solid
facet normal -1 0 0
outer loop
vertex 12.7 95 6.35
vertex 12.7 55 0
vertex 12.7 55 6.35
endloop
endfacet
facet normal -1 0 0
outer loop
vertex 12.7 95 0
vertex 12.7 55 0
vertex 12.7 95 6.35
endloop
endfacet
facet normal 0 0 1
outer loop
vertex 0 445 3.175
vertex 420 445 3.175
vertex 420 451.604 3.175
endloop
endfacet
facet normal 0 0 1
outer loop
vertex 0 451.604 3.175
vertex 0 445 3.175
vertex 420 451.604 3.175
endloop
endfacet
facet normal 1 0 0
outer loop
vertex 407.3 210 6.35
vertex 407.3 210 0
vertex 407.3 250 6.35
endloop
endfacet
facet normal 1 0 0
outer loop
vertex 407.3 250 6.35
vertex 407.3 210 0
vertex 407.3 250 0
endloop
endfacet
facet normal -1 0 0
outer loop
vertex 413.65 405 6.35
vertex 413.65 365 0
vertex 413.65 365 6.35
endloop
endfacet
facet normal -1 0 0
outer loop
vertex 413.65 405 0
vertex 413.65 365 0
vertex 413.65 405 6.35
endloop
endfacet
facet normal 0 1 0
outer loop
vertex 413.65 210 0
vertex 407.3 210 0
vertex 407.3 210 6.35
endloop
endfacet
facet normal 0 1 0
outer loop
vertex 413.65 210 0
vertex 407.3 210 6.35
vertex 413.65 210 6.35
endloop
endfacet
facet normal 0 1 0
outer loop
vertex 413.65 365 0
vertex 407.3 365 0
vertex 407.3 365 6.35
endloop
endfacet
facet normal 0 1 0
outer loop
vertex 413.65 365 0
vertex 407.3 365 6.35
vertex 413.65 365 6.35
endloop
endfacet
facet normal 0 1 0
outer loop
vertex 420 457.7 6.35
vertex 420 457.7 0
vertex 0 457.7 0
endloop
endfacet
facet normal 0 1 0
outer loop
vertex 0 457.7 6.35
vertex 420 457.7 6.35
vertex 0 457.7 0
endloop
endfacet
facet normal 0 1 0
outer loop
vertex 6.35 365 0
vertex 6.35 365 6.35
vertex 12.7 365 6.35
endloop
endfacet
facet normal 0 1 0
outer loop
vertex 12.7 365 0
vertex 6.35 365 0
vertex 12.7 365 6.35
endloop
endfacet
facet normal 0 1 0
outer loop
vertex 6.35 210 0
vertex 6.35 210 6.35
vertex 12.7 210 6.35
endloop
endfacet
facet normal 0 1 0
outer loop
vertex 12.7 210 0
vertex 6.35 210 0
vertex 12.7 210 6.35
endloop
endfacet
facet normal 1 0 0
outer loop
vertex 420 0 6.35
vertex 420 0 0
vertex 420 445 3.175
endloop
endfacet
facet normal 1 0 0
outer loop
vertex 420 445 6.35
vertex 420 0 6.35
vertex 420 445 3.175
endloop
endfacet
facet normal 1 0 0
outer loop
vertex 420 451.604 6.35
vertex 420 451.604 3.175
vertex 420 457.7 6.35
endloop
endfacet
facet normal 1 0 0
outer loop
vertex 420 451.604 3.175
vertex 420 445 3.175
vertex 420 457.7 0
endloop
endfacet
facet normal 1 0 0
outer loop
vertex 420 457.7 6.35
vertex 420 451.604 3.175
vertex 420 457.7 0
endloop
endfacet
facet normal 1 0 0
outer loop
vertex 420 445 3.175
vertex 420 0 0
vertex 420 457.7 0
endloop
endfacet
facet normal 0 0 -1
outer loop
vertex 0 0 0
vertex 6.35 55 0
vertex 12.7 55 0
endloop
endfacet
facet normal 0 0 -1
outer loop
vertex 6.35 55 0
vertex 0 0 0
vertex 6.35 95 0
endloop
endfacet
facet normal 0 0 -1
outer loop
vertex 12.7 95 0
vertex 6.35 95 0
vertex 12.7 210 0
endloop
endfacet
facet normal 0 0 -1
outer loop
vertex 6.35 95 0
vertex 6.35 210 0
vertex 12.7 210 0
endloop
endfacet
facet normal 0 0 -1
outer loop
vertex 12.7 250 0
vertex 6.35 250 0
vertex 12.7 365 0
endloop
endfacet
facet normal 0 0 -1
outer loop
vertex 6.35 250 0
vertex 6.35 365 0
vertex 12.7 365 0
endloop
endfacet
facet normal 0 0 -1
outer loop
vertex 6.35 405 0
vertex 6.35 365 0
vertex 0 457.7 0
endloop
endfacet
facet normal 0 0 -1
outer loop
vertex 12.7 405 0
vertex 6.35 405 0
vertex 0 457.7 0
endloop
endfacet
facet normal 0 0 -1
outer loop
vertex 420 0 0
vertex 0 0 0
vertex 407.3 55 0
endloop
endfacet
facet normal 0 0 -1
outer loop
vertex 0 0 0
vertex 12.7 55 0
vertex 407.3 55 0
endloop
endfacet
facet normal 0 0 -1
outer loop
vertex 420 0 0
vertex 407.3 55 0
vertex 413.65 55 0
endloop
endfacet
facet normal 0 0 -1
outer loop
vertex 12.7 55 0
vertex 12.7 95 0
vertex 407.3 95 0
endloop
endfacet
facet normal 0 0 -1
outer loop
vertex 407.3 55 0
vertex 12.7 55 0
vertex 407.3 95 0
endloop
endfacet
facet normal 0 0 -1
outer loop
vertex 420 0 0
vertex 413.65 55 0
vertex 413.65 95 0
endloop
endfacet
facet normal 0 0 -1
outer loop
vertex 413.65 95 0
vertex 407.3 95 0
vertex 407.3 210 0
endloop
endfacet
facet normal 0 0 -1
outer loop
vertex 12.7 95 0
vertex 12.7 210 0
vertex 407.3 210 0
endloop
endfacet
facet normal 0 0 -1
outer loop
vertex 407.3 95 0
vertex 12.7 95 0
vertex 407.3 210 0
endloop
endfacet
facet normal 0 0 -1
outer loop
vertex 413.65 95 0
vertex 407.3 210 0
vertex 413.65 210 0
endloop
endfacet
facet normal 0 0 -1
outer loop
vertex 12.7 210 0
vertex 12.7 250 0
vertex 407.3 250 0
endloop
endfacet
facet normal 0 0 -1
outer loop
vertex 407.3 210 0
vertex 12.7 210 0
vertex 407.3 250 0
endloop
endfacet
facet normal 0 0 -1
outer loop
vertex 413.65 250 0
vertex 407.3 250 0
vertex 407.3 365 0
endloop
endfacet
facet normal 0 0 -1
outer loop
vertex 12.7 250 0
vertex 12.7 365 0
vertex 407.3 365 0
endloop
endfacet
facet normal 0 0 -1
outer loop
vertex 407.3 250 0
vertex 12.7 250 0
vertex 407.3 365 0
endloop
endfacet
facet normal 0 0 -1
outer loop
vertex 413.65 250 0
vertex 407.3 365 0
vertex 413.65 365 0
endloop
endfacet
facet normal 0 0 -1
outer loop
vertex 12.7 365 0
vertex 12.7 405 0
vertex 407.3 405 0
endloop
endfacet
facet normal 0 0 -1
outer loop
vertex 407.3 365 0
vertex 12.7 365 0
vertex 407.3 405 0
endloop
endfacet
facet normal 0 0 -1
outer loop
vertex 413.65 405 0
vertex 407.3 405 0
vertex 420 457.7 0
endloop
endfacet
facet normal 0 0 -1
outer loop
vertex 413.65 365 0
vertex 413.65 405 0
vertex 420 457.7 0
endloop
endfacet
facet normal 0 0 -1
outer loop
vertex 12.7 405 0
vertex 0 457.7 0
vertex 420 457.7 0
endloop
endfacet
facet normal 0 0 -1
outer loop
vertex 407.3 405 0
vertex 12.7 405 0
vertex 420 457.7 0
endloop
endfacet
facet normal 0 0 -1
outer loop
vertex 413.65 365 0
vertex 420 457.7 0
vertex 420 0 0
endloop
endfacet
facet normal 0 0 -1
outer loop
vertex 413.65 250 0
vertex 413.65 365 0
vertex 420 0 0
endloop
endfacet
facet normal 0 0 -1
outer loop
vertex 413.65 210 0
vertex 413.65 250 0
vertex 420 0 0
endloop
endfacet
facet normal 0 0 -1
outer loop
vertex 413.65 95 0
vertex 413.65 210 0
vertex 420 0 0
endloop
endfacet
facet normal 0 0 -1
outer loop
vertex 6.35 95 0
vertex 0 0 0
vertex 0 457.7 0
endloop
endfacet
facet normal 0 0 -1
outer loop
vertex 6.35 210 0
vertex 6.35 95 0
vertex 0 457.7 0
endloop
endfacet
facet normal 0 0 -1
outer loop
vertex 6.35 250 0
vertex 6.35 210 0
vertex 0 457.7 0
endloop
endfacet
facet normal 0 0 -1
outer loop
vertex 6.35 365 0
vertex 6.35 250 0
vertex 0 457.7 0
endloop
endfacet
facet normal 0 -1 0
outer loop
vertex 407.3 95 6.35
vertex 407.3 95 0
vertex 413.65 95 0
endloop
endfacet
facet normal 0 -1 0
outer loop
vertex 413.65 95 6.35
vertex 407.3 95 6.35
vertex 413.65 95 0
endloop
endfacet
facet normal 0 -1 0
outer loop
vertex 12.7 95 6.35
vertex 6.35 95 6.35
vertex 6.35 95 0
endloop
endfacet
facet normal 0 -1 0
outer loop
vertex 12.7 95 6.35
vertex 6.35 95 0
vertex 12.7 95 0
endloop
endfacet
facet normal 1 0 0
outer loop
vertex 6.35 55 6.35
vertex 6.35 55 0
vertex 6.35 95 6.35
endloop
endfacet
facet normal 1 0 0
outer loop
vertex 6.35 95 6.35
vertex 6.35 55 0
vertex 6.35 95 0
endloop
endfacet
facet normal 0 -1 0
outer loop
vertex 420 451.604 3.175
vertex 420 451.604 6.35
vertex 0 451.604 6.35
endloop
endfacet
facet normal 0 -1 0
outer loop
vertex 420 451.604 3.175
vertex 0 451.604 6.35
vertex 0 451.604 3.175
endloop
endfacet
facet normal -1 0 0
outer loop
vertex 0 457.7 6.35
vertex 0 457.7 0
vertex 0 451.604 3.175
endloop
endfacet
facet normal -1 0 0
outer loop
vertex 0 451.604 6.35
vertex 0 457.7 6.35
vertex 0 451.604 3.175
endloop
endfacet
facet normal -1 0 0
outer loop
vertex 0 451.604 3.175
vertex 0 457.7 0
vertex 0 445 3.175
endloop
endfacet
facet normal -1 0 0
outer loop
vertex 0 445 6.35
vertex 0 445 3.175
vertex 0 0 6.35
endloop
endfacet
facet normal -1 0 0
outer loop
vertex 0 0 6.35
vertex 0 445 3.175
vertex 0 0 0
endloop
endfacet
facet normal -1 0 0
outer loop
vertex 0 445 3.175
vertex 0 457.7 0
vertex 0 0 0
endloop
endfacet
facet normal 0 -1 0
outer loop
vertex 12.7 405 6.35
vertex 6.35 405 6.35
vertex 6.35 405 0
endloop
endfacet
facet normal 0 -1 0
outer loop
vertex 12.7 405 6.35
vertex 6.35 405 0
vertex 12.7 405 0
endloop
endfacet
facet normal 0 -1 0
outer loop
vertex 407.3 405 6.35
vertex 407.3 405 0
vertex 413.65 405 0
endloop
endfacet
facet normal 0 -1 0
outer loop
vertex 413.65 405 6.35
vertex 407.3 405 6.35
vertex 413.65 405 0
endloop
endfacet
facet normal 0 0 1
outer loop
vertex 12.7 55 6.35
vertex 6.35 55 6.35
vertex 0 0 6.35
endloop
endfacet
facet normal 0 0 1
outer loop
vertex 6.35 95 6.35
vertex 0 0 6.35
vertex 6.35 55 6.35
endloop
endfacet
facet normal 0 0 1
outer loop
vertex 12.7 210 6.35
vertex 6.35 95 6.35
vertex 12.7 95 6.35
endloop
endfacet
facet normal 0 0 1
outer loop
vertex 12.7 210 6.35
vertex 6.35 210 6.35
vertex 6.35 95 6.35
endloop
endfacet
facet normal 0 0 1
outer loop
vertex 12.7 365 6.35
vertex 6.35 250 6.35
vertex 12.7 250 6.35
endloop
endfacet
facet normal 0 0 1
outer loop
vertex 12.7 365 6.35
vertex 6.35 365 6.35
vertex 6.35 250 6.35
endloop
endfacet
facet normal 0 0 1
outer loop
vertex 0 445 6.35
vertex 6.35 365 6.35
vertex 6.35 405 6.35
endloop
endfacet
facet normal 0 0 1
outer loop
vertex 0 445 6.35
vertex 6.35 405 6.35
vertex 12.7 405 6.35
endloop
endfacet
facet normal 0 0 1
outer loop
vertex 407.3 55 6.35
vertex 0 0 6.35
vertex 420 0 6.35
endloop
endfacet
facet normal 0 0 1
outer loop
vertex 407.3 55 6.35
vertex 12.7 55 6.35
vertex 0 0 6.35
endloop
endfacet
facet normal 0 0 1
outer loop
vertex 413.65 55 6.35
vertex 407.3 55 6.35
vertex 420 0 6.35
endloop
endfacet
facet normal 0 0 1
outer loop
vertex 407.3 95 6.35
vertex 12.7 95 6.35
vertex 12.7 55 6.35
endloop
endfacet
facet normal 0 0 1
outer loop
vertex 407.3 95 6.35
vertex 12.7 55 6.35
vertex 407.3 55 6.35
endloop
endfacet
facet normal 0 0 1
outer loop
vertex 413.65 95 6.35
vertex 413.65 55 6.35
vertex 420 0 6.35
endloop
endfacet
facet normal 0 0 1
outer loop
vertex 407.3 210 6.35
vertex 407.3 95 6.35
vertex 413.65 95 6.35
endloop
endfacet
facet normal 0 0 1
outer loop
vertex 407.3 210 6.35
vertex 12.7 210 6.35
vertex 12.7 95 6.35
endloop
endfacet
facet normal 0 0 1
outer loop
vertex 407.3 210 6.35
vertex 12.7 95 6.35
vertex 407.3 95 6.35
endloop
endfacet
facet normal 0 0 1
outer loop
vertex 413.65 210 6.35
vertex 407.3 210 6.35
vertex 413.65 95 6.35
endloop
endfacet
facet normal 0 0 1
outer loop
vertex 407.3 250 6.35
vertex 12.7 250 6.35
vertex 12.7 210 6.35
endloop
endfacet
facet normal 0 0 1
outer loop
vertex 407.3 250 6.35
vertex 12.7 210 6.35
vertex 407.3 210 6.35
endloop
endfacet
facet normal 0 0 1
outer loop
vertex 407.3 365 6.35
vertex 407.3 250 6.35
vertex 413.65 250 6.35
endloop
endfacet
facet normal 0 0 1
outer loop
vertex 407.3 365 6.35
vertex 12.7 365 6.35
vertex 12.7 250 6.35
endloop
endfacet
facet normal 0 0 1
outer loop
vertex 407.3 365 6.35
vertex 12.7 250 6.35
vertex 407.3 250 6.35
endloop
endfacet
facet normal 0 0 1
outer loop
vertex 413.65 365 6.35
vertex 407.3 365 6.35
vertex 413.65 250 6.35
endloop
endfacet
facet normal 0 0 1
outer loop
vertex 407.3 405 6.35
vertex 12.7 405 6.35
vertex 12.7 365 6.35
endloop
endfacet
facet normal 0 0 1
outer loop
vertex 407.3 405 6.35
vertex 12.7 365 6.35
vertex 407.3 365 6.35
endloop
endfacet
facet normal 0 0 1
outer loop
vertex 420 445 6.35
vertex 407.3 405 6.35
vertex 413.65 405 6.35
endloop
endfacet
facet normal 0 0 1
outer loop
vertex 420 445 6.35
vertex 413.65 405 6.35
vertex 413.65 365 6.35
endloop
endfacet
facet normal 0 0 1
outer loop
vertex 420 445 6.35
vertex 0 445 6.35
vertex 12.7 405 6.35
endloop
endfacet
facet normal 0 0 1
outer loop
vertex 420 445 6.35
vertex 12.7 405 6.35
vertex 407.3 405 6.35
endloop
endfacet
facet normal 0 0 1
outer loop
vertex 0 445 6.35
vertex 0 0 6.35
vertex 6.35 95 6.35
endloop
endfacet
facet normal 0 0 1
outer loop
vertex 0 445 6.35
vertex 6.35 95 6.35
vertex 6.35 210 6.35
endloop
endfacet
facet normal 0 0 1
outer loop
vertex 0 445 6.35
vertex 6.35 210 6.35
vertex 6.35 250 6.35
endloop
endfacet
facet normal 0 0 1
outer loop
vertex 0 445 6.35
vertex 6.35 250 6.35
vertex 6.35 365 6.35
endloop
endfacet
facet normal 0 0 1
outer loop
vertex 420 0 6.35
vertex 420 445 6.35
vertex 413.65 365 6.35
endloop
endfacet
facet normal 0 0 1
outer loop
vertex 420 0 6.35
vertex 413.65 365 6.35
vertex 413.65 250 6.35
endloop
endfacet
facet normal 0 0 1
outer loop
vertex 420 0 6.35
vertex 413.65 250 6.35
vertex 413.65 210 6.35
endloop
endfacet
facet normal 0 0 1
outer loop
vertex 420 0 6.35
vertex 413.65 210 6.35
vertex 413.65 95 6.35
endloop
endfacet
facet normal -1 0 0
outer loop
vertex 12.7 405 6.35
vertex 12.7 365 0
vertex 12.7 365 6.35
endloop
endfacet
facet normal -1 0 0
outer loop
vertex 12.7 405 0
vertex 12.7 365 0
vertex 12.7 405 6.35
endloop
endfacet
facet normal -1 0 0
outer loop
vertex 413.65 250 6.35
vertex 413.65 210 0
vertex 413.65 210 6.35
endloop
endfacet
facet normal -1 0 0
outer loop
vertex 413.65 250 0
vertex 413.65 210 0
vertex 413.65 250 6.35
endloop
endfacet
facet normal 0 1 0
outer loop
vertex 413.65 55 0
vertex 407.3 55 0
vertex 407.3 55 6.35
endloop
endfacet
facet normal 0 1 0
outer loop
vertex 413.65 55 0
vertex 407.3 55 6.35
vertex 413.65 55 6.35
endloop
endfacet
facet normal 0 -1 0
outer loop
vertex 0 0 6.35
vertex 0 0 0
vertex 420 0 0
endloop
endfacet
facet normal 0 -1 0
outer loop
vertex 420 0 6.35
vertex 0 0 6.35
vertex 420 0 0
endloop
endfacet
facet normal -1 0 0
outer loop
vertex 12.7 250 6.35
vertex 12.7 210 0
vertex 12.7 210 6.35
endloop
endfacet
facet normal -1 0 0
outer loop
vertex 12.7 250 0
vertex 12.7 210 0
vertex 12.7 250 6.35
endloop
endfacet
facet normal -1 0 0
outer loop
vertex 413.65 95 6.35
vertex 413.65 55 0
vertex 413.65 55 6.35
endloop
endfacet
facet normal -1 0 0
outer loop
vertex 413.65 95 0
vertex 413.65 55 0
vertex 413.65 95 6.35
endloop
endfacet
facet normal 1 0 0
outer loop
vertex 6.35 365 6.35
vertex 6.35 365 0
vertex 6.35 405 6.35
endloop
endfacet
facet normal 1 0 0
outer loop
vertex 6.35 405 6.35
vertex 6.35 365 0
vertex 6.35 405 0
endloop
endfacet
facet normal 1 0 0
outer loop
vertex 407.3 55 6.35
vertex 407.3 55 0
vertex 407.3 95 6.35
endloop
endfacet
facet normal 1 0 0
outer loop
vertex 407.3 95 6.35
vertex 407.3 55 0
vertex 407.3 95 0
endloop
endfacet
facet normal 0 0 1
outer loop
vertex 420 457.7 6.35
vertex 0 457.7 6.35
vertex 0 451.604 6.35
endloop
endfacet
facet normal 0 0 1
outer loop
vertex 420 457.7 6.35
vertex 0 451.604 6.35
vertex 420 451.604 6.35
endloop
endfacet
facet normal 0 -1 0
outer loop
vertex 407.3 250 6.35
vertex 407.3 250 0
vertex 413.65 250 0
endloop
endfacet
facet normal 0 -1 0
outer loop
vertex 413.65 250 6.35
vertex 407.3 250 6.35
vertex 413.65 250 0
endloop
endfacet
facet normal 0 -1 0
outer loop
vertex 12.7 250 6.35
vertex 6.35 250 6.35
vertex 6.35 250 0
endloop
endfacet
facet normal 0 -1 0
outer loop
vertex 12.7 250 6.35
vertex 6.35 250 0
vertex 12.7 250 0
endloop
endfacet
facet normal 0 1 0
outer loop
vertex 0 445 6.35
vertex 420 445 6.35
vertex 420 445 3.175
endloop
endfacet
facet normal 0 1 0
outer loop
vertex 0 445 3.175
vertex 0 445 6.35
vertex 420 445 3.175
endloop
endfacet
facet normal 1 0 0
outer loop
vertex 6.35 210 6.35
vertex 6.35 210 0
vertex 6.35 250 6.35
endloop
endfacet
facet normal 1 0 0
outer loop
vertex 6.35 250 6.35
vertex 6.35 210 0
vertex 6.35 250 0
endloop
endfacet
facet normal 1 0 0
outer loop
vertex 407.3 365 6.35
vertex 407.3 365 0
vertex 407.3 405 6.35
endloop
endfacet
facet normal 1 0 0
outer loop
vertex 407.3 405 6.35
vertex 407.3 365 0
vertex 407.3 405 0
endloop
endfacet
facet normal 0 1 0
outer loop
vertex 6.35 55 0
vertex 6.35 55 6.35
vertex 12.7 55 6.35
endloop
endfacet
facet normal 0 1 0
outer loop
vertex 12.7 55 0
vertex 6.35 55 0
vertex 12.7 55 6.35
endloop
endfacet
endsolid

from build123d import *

# Parameters (mm, degrees)
SKETCH1_W           = 6.35
SKETCH1_H           = 40
BOSS_EXTRUDE1_DEPTH = 6.35
SKETCH2_W           = 3.175
SKETCH2_H           = 6.604
CUT_EXTRUDE1_DEPTH  = 622.232333753


with BuildPart() as part:
    # Sketch1 → Boss-Extrude1 (new body)
    with BuildSketch(Plane.XY):
        Polygon((0, 0), (420, 0), (420, 457.7), (413.65, 457.7), (407.3, 457.7), (12.7, 457.7), (6.35, 457.7), (0, 457.7), align=None)
        with Locations((9.525, 385)):
            Rectangle(SKETCH1_W, SKETCH1_H, mode=Mode.SUBTRACT)
        with Locations((410.475, 385)):
            Rectangle(SKETCH1_W, SKETCH1_H, mode=Mode.SUBTRACT)
        with Locations((9.525, 230)):
            Rectangle(SKETCH1_W, SKETCH1_H, mode=Mode.SUBTRACT)
        with Locations((410.475, 230)):
            Rectangle(SKETCH1_W, SKETCH1_H, mode=Mode.SUBTRACT)
        with Locations((410.475, 75)):
            Rectangle(SKETCH1_W, SKETCH1_H, mode=Mode.SUBTRACT)
        with Locations((9.525, 75)):
            Rectangle(SKETCH1_W, SKETCH1_H, mode=Mode.SUBTRACT)
    extrude(amount=BOSS_EXTRUDE1_DEPTH)

    # Sketch2 → Cut-Extrude1 (cut, through all)
    with BuildSketch(Plane(origin=(420, 0, 0), x_dir=(0, 0, -1), z_dir=(1, 0, 0))):
        with Locations((-4.7625, 448.302)):
            Rectangle(SKETCH2_W, SKETCH2_H)
    extrude(amount=-CUT_EXTRUDE1_DEPTH, mode=Mode.SUBTRACT)


solid = part.part
